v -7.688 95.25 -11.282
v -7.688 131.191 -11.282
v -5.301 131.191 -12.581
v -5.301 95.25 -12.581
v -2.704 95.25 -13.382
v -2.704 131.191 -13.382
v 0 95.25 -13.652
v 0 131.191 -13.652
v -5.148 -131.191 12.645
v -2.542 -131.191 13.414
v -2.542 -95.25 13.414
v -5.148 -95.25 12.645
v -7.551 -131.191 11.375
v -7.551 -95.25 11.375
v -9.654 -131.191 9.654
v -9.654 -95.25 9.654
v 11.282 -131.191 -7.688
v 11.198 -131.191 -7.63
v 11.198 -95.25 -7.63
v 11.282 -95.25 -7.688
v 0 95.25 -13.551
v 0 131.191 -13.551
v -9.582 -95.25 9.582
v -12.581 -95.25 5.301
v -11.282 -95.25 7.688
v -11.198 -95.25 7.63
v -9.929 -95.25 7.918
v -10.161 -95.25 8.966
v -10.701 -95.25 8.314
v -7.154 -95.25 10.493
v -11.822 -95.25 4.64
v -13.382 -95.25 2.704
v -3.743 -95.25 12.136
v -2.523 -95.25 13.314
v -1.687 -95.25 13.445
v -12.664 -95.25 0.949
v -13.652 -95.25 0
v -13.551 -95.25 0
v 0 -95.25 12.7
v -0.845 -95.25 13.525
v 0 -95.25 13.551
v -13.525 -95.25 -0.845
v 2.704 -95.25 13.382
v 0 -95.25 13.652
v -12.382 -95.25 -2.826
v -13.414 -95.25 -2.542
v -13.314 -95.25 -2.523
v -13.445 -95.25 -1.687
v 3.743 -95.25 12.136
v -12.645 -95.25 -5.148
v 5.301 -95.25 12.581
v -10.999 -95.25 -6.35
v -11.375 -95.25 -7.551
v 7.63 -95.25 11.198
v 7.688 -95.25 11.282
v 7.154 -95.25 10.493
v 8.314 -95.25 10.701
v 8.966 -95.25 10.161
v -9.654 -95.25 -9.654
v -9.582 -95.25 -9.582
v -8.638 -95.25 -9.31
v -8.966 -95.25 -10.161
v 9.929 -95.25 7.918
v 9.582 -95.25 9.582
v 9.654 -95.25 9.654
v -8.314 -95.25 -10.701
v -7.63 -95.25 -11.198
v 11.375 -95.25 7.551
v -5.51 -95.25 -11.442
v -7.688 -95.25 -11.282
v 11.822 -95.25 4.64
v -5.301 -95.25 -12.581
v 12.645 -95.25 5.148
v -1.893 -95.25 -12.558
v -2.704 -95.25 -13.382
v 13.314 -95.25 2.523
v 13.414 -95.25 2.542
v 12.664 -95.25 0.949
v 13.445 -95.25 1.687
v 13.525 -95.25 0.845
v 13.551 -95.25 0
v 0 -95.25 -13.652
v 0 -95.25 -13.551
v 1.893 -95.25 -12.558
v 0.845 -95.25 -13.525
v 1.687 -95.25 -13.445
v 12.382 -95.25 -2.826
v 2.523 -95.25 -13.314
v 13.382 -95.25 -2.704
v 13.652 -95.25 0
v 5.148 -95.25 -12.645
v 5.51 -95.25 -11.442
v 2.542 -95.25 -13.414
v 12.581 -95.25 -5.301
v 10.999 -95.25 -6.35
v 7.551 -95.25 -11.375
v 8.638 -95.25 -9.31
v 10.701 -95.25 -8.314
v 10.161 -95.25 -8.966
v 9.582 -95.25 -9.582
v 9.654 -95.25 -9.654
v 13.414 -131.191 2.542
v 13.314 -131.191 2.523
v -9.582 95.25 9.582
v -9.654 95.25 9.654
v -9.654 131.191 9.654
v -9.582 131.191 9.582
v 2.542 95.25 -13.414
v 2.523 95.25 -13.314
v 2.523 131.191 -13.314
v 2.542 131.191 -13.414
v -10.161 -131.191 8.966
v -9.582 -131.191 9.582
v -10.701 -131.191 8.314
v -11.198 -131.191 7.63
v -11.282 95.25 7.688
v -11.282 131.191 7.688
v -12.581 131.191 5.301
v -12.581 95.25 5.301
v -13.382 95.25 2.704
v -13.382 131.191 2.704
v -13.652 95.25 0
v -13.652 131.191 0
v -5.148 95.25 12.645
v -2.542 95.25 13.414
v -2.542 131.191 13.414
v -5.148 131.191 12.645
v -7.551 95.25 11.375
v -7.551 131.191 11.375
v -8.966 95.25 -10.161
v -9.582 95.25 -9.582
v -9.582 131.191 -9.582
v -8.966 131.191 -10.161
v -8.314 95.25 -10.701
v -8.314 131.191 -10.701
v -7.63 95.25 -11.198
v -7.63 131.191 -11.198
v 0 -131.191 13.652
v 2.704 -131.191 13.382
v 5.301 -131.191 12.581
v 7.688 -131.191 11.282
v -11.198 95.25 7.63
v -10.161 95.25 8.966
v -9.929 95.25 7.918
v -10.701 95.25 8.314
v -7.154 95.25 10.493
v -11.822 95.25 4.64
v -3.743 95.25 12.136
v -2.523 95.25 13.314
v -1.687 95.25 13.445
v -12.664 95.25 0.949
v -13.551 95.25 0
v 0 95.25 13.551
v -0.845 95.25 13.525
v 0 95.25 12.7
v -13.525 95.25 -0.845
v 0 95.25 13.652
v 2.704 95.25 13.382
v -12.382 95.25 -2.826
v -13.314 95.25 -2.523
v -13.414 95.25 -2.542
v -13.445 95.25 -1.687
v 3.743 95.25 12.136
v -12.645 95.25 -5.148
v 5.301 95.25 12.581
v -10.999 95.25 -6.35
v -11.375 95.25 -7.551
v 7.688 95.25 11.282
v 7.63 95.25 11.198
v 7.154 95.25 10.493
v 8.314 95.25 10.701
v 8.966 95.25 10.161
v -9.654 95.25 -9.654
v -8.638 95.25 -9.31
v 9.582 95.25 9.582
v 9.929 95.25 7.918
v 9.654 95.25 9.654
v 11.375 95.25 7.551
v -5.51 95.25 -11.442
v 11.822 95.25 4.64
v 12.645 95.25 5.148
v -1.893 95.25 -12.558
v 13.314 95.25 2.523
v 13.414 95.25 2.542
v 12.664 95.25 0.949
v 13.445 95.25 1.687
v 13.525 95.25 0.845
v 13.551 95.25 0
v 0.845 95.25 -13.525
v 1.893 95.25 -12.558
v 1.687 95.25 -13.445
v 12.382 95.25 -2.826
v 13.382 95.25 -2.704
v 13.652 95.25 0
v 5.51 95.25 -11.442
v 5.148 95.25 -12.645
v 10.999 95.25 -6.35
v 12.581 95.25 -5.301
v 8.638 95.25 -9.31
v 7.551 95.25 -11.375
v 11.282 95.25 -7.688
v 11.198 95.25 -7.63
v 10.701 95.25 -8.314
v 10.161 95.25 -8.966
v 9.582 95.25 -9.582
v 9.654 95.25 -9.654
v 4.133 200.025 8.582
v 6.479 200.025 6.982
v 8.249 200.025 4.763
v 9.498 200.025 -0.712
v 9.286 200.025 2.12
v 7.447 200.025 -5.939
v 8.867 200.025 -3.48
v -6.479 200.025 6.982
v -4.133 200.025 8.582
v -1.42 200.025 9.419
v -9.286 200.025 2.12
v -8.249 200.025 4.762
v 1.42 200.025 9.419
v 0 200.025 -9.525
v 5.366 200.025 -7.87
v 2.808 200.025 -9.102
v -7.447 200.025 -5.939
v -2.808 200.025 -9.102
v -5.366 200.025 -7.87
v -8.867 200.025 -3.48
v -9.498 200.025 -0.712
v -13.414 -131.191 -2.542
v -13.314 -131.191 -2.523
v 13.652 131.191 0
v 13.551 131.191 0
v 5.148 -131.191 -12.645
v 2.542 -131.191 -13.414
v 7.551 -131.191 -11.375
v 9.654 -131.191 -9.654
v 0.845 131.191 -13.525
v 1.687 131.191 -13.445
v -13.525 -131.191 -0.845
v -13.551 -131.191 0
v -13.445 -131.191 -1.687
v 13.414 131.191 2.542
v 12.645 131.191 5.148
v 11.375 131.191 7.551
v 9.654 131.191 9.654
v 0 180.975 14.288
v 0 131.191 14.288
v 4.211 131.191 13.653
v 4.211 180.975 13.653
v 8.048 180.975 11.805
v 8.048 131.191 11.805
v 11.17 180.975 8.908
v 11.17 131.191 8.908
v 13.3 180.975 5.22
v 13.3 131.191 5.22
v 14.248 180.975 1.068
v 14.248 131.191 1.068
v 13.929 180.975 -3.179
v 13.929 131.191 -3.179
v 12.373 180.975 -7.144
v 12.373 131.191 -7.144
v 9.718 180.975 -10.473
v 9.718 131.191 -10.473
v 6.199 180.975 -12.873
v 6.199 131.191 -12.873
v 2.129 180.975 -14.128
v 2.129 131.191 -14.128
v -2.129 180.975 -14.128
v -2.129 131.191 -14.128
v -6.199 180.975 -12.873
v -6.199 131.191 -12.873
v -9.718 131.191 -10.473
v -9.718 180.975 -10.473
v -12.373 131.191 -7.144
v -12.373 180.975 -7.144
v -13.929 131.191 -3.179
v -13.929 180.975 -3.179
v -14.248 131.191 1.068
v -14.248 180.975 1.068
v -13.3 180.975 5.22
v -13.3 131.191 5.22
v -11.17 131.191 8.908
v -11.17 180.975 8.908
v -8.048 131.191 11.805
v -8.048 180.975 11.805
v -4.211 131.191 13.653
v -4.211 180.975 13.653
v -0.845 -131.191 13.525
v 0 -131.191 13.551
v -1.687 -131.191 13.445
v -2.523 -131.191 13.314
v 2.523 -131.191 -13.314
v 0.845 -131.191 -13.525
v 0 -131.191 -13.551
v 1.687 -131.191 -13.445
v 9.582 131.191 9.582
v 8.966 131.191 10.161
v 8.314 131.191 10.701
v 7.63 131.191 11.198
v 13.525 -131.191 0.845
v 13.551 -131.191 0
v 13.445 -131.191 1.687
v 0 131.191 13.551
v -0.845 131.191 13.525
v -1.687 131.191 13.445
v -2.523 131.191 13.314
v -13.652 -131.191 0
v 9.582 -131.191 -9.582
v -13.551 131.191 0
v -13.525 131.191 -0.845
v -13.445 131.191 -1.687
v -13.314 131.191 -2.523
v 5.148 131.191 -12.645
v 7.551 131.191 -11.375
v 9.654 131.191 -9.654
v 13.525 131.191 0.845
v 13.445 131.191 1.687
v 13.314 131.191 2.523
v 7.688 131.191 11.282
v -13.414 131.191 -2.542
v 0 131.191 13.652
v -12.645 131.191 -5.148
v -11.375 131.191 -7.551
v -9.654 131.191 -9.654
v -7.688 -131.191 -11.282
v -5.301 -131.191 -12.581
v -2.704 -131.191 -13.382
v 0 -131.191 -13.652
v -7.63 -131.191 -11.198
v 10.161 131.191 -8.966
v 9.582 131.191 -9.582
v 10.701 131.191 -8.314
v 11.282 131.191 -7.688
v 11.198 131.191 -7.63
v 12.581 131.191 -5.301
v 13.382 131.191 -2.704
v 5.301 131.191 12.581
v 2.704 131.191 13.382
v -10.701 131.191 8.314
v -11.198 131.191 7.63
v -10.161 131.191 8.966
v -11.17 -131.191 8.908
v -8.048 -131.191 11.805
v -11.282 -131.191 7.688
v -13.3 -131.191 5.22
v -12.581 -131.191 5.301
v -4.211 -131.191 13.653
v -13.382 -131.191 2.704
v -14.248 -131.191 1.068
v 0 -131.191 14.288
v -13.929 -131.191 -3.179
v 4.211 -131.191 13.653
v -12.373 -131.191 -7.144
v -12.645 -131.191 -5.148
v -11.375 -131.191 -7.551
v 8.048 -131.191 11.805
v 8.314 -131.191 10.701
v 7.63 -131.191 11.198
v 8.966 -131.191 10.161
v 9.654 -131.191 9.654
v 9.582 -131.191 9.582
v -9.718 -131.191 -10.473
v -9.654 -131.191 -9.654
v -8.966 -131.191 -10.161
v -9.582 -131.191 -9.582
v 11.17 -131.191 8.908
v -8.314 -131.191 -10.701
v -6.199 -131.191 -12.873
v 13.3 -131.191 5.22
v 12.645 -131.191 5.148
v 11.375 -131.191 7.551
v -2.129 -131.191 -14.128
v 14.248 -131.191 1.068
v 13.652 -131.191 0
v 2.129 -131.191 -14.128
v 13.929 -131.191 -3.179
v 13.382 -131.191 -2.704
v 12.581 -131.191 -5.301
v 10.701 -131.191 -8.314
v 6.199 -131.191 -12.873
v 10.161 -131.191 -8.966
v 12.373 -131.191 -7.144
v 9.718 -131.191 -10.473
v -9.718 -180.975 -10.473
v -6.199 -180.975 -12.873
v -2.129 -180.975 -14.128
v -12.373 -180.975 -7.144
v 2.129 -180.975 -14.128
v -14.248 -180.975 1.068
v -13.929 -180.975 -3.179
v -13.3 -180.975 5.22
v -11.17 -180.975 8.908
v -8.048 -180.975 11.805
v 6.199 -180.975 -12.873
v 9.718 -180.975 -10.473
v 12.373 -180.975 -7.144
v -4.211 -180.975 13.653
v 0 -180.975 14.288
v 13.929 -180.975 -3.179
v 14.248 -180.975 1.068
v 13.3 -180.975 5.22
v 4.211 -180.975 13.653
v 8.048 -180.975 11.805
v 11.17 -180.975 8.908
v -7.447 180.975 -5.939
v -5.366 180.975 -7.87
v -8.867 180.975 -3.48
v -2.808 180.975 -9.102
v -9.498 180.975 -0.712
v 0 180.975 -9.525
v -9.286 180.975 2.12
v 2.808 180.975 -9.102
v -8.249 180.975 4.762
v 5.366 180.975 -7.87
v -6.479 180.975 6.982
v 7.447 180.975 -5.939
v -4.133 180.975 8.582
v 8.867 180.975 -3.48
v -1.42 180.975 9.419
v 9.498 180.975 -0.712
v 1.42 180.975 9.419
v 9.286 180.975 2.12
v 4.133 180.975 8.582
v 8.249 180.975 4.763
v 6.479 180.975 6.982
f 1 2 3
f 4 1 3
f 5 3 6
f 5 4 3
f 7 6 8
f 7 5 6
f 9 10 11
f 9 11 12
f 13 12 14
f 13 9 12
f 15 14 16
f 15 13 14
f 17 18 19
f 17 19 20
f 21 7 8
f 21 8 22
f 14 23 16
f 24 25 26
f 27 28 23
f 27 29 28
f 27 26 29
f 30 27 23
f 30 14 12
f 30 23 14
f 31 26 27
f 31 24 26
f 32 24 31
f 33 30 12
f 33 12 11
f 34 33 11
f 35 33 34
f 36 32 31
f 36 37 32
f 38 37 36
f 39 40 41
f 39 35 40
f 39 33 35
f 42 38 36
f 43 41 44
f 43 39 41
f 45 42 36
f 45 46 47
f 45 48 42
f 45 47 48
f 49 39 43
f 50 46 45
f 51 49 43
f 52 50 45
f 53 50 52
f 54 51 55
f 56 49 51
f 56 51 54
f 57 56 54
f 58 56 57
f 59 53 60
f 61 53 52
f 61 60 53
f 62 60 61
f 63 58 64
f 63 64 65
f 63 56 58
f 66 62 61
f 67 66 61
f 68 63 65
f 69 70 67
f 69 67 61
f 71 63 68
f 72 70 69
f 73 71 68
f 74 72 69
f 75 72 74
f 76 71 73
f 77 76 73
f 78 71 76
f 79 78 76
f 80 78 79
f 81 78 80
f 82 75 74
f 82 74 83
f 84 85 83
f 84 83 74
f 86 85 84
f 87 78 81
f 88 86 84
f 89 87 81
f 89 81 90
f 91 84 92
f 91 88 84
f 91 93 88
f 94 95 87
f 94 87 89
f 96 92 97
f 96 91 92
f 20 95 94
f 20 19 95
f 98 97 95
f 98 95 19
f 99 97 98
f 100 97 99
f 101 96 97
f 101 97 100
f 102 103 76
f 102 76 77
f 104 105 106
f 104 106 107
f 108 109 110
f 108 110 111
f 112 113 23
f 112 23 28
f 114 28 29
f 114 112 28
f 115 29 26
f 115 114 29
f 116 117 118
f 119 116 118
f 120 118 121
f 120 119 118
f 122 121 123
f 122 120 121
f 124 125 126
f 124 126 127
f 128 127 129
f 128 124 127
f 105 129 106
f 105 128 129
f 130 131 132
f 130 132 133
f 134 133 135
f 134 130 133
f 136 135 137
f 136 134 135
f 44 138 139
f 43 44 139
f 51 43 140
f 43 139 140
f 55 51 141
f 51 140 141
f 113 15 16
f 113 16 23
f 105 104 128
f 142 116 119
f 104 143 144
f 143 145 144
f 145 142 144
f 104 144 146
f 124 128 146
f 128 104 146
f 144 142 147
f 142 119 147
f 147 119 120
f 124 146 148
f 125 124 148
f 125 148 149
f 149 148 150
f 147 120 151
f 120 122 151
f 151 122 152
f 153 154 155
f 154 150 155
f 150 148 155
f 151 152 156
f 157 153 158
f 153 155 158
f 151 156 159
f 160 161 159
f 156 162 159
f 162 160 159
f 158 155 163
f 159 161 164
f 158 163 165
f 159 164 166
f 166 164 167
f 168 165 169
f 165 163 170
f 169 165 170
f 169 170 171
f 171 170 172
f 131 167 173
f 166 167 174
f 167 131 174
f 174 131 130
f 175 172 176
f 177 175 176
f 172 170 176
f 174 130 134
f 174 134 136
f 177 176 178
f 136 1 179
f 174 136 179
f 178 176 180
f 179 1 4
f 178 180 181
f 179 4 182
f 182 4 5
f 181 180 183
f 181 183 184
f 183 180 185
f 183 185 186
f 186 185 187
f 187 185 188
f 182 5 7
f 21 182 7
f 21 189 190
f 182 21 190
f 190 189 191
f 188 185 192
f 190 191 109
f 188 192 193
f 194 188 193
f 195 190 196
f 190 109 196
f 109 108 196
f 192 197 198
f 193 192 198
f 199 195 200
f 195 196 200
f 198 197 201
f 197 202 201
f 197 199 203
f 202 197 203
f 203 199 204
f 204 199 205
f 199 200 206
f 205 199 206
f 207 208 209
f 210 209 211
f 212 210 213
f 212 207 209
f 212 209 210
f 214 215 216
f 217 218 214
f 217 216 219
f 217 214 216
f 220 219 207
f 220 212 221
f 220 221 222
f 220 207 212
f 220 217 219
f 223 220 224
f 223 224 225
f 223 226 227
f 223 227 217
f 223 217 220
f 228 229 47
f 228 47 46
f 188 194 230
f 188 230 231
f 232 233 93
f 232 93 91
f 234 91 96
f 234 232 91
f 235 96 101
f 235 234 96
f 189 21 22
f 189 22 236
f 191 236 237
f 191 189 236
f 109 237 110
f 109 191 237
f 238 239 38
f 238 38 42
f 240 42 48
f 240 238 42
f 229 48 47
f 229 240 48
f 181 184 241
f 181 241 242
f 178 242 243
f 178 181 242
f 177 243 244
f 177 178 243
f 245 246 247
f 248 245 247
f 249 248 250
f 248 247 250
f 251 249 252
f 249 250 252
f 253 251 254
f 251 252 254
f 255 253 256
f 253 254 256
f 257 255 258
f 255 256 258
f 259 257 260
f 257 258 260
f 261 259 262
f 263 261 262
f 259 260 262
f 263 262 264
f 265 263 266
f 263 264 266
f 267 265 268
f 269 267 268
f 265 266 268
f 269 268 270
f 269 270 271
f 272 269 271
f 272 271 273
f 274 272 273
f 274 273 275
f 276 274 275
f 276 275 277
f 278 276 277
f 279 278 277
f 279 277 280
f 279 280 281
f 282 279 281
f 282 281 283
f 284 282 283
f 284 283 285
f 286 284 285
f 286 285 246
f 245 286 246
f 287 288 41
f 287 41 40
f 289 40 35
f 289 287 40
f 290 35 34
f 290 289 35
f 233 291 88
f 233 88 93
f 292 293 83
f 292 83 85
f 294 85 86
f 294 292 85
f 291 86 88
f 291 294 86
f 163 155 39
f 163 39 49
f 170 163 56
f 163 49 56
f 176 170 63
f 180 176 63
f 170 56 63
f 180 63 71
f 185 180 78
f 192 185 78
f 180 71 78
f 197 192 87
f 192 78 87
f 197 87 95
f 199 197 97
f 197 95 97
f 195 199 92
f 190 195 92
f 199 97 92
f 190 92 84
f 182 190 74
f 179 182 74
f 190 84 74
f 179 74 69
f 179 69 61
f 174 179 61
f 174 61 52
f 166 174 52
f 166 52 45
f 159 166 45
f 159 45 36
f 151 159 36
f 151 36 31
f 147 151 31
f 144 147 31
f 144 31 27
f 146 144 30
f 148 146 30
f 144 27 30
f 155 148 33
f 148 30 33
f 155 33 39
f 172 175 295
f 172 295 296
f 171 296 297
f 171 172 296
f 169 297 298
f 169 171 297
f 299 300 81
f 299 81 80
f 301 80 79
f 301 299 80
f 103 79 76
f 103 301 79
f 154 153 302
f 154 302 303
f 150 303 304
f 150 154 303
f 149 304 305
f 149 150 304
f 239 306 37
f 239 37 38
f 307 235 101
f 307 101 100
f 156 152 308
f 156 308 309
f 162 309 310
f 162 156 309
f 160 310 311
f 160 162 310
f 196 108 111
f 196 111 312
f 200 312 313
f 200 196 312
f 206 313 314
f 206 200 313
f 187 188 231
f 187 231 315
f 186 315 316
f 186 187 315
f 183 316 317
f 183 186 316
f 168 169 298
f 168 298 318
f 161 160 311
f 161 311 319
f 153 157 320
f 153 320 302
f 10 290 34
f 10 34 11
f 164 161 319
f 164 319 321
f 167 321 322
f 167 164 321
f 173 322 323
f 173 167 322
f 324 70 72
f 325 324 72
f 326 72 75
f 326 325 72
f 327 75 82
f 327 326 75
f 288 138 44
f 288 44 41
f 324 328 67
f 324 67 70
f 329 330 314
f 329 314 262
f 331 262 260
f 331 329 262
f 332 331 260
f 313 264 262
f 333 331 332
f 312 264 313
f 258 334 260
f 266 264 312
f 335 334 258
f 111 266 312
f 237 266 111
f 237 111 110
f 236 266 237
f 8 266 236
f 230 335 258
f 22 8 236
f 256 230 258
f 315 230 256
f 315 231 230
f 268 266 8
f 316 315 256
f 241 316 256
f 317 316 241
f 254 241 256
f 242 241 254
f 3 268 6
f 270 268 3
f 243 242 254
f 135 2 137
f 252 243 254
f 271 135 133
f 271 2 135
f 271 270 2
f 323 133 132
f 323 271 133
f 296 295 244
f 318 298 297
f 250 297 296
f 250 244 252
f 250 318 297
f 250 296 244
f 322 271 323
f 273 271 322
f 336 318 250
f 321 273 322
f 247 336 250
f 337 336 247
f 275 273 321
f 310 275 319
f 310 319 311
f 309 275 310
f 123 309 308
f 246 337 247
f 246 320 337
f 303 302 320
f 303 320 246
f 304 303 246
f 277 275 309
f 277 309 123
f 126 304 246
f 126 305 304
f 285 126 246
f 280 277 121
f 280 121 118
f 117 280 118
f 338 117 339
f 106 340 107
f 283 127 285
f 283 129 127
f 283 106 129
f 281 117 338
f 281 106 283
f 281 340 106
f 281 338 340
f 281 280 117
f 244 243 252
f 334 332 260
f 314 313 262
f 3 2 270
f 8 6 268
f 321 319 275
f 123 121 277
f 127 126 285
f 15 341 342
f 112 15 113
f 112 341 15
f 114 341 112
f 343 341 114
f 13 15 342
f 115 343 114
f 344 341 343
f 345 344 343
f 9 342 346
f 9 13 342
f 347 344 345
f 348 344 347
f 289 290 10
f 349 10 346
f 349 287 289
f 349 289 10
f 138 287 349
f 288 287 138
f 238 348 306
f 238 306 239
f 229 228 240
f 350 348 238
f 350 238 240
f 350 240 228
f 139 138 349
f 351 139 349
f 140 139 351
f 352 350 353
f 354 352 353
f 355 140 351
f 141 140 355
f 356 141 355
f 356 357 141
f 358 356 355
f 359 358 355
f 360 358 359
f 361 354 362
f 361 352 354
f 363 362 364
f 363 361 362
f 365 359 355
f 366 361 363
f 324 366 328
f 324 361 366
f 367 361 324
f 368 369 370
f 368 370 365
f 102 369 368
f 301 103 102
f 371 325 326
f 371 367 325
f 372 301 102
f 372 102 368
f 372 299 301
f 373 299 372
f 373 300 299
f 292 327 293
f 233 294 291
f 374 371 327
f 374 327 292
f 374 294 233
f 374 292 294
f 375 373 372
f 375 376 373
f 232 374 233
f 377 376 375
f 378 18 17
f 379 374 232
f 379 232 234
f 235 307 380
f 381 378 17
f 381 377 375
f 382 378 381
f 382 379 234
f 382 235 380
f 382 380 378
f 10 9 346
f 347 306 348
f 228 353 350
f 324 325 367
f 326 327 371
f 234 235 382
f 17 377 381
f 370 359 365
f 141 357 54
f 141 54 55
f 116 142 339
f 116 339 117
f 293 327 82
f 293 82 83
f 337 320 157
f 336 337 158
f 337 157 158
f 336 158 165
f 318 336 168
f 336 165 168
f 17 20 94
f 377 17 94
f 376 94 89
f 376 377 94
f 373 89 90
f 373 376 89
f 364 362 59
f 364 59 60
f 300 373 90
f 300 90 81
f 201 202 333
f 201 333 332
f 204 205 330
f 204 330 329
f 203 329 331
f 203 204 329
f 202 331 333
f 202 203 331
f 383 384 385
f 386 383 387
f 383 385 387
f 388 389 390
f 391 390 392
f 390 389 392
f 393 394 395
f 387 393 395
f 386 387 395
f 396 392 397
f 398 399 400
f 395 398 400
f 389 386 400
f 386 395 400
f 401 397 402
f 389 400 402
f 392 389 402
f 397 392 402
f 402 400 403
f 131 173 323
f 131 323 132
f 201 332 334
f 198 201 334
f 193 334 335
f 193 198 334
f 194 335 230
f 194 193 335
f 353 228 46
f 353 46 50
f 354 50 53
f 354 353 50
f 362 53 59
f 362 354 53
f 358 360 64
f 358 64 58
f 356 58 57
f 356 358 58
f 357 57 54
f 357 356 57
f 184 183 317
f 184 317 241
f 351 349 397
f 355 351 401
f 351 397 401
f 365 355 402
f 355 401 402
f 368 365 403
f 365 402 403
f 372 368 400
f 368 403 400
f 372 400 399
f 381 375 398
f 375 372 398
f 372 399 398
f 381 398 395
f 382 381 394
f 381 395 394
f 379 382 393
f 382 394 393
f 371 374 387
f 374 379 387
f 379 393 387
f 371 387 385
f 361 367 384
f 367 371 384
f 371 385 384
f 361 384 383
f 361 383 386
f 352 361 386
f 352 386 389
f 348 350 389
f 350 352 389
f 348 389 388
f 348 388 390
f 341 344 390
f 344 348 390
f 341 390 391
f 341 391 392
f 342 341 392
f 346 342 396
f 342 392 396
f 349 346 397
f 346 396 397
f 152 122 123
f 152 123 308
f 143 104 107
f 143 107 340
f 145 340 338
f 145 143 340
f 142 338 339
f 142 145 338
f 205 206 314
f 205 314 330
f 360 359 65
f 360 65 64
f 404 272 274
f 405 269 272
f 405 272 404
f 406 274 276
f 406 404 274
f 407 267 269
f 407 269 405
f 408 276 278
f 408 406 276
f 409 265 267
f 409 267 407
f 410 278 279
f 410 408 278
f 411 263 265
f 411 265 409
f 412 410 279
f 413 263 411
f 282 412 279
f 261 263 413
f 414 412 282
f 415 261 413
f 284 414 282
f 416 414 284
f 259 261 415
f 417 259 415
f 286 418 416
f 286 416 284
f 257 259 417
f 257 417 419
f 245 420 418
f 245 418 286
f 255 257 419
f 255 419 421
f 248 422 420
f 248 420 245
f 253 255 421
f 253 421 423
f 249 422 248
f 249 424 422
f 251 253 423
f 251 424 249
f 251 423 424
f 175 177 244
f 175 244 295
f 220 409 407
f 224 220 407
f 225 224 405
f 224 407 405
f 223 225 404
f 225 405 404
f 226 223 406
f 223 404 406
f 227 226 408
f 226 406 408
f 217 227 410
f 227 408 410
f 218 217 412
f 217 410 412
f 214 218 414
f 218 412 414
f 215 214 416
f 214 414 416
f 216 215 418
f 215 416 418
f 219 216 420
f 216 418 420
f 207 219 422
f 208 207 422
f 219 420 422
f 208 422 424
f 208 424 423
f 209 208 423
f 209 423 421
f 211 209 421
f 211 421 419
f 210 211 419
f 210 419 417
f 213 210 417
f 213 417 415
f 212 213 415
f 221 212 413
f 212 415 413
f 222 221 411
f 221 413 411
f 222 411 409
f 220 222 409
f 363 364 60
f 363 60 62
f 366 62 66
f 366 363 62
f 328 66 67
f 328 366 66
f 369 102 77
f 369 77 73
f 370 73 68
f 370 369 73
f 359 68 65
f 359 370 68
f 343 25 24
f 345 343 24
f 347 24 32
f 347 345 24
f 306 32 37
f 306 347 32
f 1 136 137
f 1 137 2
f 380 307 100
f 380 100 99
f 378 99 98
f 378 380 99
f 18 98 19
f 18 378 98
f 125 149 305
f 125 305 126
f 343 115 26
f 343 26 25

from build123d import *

# Parameters (mm, degrees)
BOSS_EXTRUDE1_DEPTH      = 180.975
BOSS_EXTRUDE1_DEPTH_BACK = 180.975
SKETCH1_R                = 14.2875
CUT_EXTRUDE1_DEPTH       = 95.25
CUT_EXTRUDE1_DEPTH_BACK  = 95.25
SKETCH2_OUTSIDE_W        = 103.416
SKETCH2_OUTSIDE_H        = 103.416
SKETCH2_OUTSIDE_R        = 12.7
CUT_EXTRUDE2_DEPTH       = 131.191
CUT_EXTRUDE2_DEPTH_BACK  = 131.191
SKETCH3_OUTSIDE_W        = 103.416
SKETCH3_OUTSIDE_H        = 103.416
SKETCH3_OUTSIDE_R        = 13.6525
SKETCH5_OUTSIDE_W        = 103.416
SKETCH5_OUTSIDE_H        = 103.416
CUT_EXTRUDE4_DEPTH       = 35.941
CUT_EXTRUDE7_START       = 35.941
SKETCH6_R                = 14.2875
CUT_EXTRUDE7_DEPTH       = 35.941
SKETCH7_R                = 9.525
BOSS_EXTRUDE2_DEPTH      = 19.05


with BuildPart() as part:
    # Sketch1 → Boss-Extrude1 (new, two sides: drawn at the far end of the back side and taken through both)
    with BuildSketch(Plane(origin=(0, 0, 0), x_dir=(1, 0, 0), z_dir=(0, 1, 0)).offset(-BOSS_EXTRUDE1_DEPTH_BACK)):
        with Locations(Location((0, 0, 0), (0, 0, 270))):
            Circle(SKETCH1_R)
    extrude(amount=BOSS_EXTRUDE1_DEPTH + BOSS_EXTRUDE1_DEPTH_BACK)

    # Sketch2 outside → Cut-Extrude1 (cut, two sides: drawn at the far end of the back side and taken through both)
    with BuildSketch(Plane(origin=(0, 0, 0), x_dir=(1, 0, 0), z_dir=(0, 1, 0)).offset(-CUT_EXTRUDE1_DEPTH_BACK)):
        Rectangle(SKETCH2_OUTSIDE_W, SKETCH2_OUTSIDE_H)
        with Locations(Location((0, 0, 0), (0, 0, 270))):
            Circle(SKETCH2_OUTSIDE_R, mode=Mode.SUBTRACT)
    extrude(amount=CUT_EXTRUDE1_DEPTH + CUT_EXTRUDE1_DEPTH_BACK, mode=Mode.SUBTRACT)

    # Sketch3 outside → Cut-Extrude2 (cut, two sides: drawn at the far end of the back side and taken through both)
    with BuildSketch(Plane(origin=(0, 0, 0), x_dir=(1, 0, 0), z_dir=(0, 1, 0)).offset(-CUT_EXTRUDE2_DEPTH_BACK)):
        Rectangle(SKETCH3_OUTSIDE_W, SKETCH3_OUTSIDE_H)
        with Locations(Location((0, 0, 0), (0, 0, 270))):
            Circle(SKETCH3_OUTSIDE_R, mode=Mode.SUBTRACT)
    extrude(amount=CUT_EXTRUDE2_DEPTH + CUT_EXTRUDE2_DEPTH_BACK, mode=Mode.SUBTRACT)

    # Sketch5 outside → Cut-Extrude4 (cut)
    with BuildSketch(Plane(origin=(0, -131.191, 0), x_dir=(1, 0, 0), z_dir=(0, 1, 0))):
        Rectangle(SKETCH5_OUTSIDE_W, SKETCH5_OUTSIDE_H)
        with BuildLine():
            Line((0, -13.6525), (0, -13.5509))
            ThreePointArc((0, -13.5509), (-1.267011069, -13.491537116), (-2.522921262, -13.313968571))
            Line((-2.522921262, -13.313968571), (-2.54183726, -13.413792141))
            ThreePointArc((-2.54183726, -13.413792141), (-6.381040136, -12.069510472), (-9.65377533, -9.65377533))
            Line((-9.65377533, -9.65377533), (-9.581933281, -9.581933281))
            ThreePointArc((-9.581933281, -9.581933281), (-10.435869502, -8.644045265), (-11.198372194, -7.630422729))
            Line((-11.198372194, -7.630422729), (-11.282333747, -7.687633021))
            ThreePointArc((-11.282333747, -7.687633021), (-13.046509451, -4.022355949), (-13.6525, 0))
            Line((-13.6525, 0), (-13.5509, 0))
            ThreePointArc((-13.5509, 0), (-13.491537116, 1.267011069), (-13.313968571, 2.522921262))
            Line((-13.313968571, 2.522921262), (-13.413792141, 2.54183726))
            ThreePointArc((-13.413792141, 2.54183726), (-12.069510472, 6.381040136), (-9.65377533, 9.65377533))
            Line((-9.65377533, 9.65377533), (-9.581933281, 9.581933281))
            ThreePointArc((-9.581933281, 9.581933281), (-8.644045265, 10.435869502), (-7.630422729, 11.198372194))
            Line((-7.630422729, 11.198372194), (-7.687633021, 11.282333747))
            ThreePointArc((-7.687633021, 11.282333747), (-4.022355949, 13.046509451), (0, 13.6525))
            Line((0, 13.6525), (0, 13.5509))
            ThreePointArc((0, 13.5509), (1.267011069, 13.491537116), (2.522921262, 13.313968571))
            Line((2.522921262, 13.313968571), (2.54183726, 13.413792141))
            ThreePointArc((2.54183726, 13.413792141), (6.381040136, 12.069510472), (9.65377533, 9.65377533))
            Line((9.65377533, 9.65377533), (9.581933281, 9.581933281))
            ThreePointArc((9.581933281, 9.581933281), (10.435869502, 8.644045265), (11.198372194, 7.630422729))
            Line((11.198372194, 7.630422729), (11.282333747, 7.687633021))
            ThreePointArc((11.282333747, 7.687633021), (13.046509451, 4.022355949), (13.6525, 0))
            Line((13.6525, 0), (13.5509, 0))
            ThreePointArc((13.5509, 0), (13.491537116, -1.267011069), (13.313968571, -2.522921262))
            Line((13.313968571, -2.522921262), (13.413792141, -2.54183726))
            ThreePointArc((13.413792141, -2.54183726), (12.069510472, -6.381040136), (9.65377533, -9.65377533))
            Line((9.65377533, -9.65377533), (9.581933281, -9.581933281))
            ThreePointArc((9.581933281, -9.581933281), (8.644045265, -10.435869502), (7.630422729, -11.198372194))
            Line((7.630422729, -11.198372194), (7.687633021, -11.282333747))
            ThreePointArc((7.687633021, -11.282333747), (4.022355949, -13.046509451), (0, -13.6525))
        make_face(mode=Mode.SUBTRACT)
    extrude(amount=CUT_EXTRUDE4_DEPTH, mode=Mode.SUBTRACT)

    # Sketch6 → Cut-Extrude7 (cut)
    with BuildSketch(Plane.XZ.offset(-131.191).offset(CUT_EXTRUDE7_START)):
        with Locations(Location((0, 0, 0), (0, 0, 90))):
            Circle(SKETCH6_R)
        with BuildLine():
            Line((-13.6525, 0), (-13.5509, 0))
            ThreePointArc((-13.5509, 0), (-13.491537116, -1.267011069), (-13.313968571, -2.522921262))
            Line((-13.313968571, -2.522921262), (-13.413792141, -2.54183726))
            ThreePointArc((-13.413792141, -2.54183726), (-12.069510472, -6.381040136), (-9.65377533, -9.65377533))
            Line((-9.65377533, -9.65377533), (-9.581933281, -9.581933281))
            ThreePointArc((-9.581933281, -9.581933281), (-8.644045265, -10.435869502), (-7.630422729, -11.198372194))
            Line((-7.630422729, -11.198372194), (-7.687633021, -11.282333747))
            ThreePointArc((-7.687633021, -11.282333747), (-4.022355949, -13.046509451), (0, -13.6525))
            Line((0, -13.6525), (0, -13.5509))
            ThreePointArc((0, -13.5509), (1.267011069, -13.491537116), (2.522921262, -13.313968571))
            Line((2.522921262, -13.313968571), (2.54183726, -13.413792141))
            ThreePointArc((2.54183726, -13.413792141), (6.381040136, -12.069510472), (9.65377533, -9.65377533))
            Line((9.65377533, -9.65377533), (9.581933281, -9.581933281))
            ThreePointArc((9.581933281, -9.581933281), (10.435869502, -8.644045265), (11.198372194, -7.630422729))
            Line((11.198372194, -7.630422729), (11.282333747, -7.687633021))
            ThreePointArc((11.282333747, -7.687633021), (13.046509451, -4.022355949), (13.6525, 0))
            Line((13.6525, 0), (13.5509, 0))
            ThreePointArc((13.5509, 0), (13.491537116, 1.267011069), (13.313968571, 2.522921262))
            Line((13.313968571, 2.522921262), (13.413792141, 2.54183726))
            ThreePointArc((13.413792141, 2.54183726), (12.069510472, 6.381040136), (9.65377533, 9.65377533))
            Line((9.65377533, 9.65377533), (9.581933281, 9.581933281))
            ThreePointArc((9.581933281, 9.581933281), (8.644045265, 10.435869502), (7.630422729, 11.198372194))
            Line((7.630422729, 11.198372194), (7.687633021, 11.282333747))
            ThreePointArc((7.687633021, 11.282333747), (4.022355949, 13.046509451), (0, 13.6525))
            Line((0, 13.6525), (0, 13.5509))
            ThreePointArc((0, 13.5509), (-1.267011069, 13.491537116), (-2.522921262, 13.313968571))
            Line((-2.522921262, 13.313968571), (-2.54183726, 13.413792141))
            ThreePointArc((-2.54183726, 13.413792141), (-6.381040136, 12.069510472), (-9.65377533, 9.65377533))
            Line((-9.65377533, 9.65377533), (-9.581933281, 9.581933281))
            ThreePointArc((-9.581933281, 9.581933281), (-10.435869502, 8.644045265), (-11.198372194, 7.630422729))
            Line((-11.198372194, 7.630422729), (-11.282333747, 7.687633021))
            ThreePointArc((-11.282333747, 7.687633021), (-13.046509451, 4.022355949), (-13.6525, 0))
        make_face(mode=Mode.SUBTRACT)
    extrude(amount=-CUT_EXTRUDE7_DEPTH, mode=Mode.SUBTRACT)

    # Sketch7 → Boss-Extrude2 (add)
    with BuildSketch(Plane(origin=(0, 180.975, 0), x_dir=(1, 0, 0), z_dir=(0, 1, 0))):
        with Locations(Location((0, 0, 0), (0, 0, 90))):
            Circle(SKETCH7_R)
    extrude(amount=BOSS_EXTRUDE2_DEPTH)


solid = part.part
